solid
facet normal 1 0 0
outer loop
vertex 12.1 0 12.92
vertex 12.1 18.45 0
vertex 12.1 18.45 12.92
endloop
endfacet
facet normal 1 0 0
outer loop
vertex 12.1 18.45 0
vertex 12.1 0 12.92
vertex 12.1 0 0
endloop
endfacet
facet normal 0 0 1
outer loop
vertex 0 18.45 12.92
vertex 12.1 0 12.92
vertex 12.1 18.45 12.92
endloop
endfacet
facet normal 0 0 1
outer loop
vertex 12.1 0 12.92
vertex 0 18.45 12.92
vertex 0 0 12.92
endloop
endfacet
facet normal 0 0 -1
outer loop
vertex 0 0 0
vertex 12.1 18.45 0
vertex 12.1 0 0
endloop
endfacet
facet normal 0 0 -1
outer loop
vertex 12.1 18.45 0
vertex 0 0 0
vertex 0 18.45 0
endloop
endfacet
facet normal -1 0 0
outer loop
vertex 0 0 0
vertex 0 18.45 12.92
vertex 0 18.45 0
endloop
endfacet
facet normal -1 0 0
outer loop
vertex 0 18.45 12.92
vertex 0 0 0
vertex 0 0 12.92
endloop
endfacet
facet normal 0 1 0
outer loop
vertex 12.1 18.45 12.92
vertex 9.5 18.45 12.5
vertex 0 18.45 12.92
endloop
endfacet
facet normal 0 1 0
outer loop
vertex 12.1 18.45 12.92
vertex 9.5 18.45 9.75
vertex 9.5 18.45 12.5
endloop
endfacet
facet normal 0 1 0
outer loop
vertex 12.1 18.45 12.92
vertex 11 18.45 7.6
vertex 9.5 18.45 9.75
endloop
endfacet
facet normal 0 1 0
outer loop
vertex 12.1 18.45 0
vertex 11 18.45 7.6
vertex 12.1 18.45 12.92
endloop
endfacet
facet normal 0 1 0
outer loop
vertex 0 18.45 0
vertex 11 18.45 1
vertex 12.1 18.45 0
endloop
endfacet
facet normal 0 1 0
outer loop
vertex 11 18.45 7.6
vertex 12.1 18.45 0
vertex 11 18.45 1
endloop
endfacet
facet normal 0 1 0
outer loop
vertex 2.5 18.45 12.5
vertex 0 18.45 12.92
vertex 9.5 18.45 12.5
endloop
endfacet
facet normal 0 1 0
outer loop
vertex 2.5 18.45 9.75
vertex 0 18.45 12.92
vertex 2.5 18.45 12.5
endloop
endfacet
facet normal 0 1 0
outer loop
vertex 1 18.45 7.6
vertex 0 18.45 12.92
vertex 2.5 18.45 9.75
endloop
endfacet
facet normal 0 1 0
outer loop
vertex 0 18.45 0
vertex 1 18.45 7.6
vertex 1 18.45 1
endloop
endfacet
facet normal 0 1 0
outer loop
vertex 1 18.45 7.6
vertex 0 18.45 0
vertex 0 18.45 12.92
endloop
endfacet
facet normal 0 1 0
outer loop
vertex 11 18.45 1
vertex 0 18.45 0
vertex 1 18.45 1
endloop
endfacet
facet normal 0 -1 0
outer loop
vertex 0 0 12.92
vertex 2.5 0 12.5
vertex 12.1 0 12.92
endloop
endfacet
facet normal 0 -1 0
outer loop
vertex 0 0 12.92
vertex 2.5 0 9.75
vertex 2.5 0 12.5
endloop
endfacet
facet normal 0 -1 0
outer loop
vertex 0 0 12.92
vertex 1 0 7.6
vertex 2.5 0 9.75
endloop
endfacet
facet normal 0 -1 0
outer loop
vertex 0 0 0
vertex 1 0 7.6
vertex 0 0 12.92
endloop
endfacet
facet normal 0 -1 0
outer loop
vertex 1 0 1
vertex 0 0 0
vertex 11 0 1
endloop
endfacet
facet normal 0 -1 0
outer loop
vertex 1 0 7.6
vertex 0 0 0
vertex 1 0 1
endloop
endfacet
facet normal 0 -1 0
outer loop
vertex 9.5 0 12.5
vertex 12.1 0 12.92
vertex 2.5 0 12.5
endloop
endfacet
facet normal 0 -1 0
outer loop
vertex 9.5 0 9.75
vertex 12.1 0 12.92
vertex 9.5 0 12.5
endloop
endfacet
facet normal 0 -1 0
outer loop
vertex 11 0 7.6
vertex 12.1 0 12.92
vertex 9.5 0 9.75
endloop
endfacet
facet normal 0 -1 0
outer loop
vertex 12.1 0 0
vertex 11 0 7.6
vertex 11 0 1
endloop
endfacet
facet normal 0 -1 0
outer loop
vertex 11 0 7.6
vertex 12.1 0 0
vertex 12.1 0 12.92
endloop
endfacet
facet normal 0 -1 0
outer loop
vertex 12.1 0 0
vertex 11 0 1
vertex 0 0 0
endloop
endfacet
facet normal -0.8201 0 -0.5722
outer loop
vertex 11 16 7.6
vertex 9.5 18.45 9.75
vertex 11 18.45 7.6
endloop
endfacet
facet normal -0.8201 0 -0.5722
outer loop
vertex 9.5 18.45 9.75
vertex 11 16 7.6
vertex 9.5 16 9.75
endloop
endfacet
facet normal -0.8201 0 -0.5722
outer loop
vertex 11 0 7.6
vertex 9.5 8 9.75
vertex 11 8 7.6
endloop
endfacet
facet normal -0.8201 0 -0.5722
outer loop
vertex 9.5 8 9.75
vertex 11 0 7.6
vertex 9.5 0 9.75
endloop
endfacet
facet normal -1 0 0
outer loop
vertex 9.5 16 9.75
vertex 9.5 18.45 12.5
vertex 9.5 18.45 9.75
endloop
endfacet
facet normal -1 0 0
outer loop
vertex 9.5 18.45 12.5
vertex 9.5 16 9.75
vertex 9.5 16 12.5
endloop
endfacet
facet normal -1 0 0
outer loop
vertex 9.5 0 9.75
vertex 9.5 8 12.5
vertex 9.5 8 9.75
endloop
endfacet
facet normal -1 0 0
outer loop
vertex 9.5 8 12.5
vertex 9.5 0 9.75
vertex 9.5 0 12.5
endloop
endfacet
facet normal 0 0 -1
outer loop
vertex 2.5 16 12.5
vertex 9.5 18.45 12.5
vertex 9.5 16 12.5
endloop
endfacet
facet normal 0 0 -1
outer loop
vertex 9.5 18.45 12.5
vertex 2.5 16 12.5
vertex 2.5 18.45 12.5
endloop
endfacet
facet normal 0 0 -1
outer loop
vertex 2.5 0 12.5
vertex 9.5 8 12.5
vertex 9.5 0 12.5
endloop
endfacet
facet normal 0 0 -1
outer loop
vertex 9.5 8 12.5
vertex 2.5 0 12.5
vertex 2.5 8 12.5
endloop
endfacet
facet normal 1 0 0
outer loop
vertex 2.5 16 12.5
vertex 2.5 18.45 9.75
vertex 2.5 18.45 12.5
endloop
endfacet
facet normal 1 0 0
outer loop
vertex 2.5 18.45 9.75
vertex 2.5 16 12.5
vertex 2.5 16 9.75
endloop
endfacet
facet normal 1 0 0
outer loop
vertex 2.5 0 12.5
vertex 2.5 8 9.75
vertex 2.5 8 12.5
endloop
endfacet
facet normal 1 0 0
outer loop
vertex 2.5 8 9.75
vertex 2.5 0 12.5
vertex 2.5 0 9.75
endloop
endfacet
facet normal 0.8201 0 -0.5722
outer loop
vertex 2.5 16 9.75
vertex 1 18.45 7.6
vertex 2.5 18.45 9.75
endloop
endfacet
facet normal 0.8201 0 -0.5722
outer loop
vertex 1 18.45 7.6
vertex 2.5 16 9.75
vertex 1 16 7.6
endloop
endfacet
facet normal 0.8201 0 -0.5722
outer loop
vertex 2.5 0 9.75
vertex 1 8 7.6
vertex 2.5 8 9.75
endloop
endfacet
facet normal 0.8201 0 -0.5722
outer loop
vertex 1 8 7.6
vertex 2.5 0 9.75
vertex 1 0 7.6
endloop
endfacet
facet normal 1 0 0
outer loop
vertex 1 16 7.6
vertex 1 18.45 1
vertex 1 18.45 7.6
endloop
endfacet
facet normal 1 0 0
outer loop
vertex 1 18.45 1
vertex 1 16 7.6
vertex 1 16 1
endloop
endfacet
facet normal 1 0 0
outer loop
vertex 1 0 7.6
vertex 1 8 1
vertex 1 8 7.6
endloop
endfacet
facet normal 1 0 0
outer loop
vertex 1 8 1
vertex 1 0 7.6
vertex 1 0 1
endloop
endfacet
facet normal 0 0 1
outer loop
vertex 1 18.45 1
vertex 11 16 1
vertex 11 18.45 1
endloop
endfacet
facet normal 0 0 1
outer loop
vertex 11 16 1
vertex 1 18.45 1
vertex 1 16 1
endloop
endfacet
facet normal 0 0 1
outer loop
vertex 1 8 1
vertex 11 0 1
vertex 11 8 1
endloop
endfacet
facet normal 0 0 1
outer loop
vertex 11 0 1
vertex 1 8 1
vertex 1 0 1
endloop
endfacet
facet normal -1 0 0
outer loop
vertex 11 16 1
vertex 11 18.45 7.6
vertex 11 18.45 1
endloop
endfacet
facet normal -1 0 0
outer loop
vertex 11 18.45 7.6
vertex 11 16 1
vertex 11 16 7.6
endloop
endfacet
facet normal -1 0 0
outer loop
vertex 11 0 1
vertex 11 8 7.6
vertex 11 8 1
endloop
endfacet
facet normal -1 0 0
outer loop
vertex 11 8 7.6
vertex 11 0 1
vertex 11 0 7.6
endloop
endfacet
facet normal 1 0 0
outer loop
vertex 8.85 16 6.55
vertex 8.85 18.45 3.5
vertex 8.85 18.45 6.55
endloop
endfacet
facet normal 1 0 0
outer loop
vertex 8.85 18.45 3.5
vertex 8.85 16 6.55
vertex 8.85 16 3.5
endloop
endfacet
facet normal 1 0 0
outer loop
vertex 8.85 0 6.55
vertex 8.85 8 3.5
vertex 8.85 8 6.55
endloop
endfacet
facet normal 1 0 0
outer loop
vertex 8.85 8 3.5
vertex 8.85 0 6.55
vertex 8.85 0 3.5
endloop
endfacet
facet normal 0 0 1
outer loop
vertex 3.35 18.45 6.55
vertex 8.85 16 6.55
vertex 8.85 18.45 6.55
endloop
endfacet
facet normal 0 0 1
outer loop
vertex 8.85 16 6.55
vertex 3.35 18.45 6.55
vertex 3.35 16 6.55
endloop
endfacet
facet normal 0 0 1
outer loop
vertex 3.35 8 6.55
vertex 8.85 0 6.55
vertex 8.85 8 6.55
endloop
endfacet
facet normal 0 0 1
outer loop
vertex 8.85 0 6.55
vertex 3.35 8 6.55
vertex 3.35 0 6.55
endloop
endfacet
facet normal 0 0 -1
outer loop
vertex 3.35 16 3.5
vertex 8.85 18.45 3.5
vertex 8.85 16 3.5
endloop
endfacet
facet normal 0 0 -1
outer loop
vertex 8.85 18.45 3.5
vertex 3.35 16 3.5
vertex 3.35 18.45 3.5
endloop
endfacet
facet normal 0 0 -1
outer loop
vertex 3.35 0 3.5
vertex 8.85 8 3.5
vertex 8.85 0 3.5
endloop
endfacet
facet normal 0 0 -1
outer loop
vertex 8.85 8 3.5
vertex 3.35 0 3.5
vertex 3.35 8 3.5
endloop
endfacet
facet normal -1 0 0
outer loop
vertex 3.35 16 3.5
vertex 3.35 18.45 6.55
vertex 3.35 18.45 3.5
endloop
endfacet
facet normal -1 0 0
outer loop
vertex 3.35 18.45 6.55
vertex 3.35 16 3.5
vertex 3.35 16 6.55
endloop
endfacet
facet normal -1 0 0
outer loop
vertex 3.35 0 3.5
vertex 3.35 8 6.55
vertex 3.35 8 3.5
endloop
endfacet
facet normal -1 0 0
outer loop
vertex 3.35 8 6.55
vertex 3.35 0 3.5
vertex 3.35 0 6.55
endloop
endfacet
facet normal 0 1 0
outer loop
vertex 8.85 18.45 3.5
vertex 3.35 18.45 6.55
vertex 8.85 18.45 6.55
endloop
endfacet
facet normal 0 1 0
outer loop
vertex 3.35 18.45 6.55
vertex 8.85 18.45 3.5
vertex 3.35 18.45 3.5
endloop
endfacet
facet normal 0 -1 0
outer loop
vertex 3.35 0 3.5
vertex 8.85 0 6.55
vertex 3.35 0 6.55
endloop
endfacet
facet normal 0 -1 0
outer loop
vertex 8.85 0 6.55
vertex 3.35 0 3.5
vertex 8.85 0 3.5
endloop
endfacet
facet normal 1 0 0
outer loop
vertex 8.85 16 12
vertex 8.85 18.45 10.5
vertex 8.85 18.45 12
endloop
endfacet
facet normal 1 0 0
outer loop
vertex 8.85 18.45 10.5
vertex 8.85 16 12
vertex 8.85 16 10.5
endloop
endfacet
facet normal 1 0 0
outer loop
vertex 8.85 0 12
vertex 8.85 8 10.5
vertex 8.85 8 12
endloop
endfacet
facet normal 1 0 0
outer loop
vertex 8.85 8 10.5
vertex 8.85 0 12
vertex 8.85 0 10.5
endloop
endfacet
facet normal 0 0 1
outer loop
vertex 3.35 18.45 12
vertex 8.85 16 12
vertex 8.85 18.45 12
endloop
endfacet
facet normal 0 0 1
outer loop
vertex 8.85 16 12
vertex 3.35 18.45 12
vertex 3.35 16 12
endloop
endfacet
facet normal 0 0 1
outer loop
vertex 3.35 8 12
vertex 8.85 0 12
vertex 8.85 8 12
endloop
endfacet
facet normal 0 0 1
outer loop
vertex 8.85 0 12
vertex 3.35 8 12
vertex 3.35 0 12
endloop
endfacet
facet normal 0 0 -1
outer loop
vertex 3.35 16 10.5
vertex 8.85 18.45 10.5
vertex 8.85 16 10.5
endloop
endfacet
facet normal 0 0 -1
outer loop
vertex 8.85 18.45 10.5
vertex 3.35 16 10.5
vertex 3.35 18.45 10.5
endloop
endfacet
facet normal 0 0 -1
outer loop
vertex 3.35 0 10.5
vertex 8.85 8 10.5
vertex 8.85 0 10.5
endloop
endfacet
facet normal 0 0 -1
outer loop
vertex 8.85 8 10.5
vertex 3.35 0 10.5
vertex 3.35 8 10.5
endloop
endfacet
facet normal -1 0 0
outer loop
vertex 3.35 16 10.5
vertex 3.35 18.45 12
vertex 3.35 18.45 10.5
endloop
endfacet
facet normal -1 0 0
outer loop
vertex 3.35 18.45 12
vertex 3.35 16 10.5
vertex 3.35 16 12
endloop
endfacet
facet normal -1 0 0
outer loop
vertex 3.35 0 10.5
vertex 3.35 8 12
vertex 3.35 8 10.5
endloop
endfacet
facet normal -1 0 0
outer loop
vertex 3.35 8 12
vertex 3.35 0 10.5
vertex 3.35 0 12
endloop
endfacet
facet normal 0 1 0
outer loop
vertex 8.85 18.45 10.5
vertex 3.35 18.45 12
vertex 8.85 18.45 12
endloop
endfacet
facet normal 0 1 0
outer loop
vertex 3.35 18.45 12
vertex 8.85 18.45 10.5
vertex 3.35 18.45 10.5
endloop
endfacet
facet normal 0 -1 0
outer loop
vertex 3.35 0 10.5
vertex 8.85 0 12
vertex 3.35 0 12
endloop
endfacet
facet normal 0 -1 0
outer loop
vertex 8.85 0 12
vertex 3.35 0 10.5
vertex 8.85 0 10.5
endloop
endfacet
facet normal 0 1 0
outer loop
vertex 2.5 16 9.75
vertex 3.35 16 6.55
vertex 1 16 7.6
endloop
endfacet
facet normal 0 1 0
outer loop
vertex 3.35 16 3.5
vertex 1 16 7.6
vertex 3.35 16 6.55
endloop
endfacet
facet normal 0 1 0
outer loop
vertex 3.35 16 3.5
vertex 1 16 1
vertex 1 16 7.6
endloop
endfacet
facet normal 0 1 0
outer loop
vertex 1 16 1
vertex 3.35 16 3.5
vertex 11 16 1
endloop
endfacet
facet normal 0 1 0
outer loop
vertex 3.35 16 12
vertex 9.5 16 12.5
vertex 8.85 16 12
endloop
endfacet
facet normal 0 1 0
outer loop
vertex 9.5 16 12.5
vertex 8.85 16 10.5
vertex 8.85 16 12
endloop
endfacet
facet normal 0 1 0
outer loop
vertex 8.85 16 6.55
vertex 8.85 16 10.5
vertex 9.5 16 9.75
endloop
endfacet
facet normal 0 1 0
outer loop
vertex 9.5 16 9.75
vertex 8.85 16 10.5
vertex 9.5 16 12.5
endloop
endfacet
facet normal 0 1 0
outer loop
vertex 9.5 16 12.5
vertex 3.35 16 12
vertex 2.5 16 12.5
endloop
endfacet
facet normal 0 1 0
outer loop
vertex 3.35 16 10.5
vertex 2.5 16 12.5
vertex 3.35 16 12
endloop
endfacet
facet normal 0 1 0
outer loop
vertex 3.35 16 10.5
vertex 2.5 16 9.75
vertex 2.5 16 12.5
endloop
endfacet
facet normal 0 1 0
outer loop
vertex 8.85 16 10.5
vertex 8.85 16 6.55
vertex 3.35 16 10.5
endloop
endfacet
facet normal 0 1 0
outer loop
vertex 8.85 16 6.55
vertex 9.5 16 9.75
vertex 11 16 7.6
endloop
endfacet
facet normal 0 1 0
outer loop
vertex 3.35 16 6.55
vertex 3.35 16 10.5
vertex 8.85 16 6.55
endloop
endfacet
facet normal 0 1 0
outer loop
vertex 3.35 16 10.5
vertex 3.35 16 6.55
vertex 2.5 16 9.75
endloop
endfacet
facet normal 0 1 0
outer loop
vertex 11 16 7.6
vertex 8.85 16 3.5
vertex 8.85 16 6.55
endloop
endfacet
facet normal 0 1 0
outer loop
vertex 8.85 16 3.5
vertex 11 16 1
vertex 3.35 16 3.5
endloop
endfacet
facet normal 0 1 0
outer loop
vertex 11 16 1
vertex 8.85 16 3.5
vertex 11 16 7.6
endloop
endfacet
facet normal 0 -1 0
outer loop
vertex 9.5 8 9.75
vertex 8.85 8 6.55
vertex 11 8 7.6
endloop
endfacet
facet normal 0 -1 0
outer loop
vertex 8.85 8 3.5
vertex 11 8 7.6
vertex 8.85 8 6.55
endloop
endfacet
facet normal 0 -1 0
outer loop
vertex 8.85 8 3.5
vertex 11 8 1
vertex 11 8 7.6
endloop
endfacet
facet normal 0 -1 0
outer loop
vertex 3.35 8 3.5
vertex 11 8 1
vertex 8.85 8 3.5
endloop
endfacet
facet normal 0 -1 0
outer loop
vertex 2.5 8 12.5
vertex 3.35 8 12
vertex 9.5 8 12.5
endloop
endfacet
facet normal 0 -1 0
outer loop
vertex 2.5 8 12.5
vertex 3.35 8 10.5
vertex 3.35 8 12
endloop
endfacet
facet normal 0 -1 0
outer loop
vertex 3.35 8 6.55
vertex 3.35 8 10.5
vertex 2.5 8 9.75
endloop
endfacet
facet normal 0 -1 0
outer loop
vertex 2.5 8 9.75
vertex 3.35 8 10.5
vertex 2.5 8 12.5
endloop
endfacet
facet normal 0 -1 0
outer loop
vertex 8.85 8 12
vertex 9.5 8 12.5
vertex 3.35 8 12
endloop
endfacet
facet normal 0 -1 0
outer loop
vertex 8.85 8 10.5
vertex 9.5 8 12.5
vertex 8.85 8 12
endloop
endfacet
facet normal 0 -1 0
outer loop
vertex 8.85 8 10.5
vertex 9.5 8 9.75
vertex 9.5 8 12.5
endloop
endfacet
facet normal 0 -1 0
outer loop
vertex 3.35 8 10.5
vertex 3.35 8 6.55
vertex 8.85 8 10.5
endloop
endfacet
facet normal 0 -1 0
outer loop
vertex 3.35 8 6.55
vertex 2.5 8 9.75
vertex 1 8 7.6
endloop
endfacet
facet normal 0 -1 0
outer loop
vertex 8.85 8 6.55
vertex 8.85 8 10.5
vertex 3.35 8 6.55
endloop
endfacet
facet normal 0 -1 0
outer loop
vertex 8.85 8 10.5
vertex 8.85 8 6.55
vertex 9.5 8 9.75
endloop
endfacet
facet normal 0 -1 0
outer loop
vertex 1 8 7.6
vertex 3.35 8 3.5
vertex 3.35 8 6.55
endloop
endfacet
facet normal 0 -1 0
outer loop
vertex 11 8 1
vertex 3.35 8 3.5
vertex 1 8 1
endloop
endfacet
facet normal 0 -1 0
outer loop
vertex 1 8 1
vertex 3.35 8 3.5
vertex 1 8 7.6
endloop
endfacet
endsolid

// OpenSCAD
usb3();

module usb3(){


color("white")
difference(){
cube([12.1,18.45,12.92]);



translate([1,-1,1])
rotate([90,0,0])
linear_extrude(40,center=true

){
polygon([
[0,0],
[10,0],
[10,6.6],
[8.5,8.75],
    [8.5,11.5],
    [1.5,11.5],
[1.5,8.75],
[0,6.6]
]);
    
    }}

color("blue")
translate([6.1-2.75,0,3.5])
cube([5.5,18.45,3.05]);

color("blue")
translate([6.1-2.75,0,10.5])
cube([5.5,18.45,1.5]);

color("black")
translate([0,8,0])
cube([12.1,8,12.92]);
}
